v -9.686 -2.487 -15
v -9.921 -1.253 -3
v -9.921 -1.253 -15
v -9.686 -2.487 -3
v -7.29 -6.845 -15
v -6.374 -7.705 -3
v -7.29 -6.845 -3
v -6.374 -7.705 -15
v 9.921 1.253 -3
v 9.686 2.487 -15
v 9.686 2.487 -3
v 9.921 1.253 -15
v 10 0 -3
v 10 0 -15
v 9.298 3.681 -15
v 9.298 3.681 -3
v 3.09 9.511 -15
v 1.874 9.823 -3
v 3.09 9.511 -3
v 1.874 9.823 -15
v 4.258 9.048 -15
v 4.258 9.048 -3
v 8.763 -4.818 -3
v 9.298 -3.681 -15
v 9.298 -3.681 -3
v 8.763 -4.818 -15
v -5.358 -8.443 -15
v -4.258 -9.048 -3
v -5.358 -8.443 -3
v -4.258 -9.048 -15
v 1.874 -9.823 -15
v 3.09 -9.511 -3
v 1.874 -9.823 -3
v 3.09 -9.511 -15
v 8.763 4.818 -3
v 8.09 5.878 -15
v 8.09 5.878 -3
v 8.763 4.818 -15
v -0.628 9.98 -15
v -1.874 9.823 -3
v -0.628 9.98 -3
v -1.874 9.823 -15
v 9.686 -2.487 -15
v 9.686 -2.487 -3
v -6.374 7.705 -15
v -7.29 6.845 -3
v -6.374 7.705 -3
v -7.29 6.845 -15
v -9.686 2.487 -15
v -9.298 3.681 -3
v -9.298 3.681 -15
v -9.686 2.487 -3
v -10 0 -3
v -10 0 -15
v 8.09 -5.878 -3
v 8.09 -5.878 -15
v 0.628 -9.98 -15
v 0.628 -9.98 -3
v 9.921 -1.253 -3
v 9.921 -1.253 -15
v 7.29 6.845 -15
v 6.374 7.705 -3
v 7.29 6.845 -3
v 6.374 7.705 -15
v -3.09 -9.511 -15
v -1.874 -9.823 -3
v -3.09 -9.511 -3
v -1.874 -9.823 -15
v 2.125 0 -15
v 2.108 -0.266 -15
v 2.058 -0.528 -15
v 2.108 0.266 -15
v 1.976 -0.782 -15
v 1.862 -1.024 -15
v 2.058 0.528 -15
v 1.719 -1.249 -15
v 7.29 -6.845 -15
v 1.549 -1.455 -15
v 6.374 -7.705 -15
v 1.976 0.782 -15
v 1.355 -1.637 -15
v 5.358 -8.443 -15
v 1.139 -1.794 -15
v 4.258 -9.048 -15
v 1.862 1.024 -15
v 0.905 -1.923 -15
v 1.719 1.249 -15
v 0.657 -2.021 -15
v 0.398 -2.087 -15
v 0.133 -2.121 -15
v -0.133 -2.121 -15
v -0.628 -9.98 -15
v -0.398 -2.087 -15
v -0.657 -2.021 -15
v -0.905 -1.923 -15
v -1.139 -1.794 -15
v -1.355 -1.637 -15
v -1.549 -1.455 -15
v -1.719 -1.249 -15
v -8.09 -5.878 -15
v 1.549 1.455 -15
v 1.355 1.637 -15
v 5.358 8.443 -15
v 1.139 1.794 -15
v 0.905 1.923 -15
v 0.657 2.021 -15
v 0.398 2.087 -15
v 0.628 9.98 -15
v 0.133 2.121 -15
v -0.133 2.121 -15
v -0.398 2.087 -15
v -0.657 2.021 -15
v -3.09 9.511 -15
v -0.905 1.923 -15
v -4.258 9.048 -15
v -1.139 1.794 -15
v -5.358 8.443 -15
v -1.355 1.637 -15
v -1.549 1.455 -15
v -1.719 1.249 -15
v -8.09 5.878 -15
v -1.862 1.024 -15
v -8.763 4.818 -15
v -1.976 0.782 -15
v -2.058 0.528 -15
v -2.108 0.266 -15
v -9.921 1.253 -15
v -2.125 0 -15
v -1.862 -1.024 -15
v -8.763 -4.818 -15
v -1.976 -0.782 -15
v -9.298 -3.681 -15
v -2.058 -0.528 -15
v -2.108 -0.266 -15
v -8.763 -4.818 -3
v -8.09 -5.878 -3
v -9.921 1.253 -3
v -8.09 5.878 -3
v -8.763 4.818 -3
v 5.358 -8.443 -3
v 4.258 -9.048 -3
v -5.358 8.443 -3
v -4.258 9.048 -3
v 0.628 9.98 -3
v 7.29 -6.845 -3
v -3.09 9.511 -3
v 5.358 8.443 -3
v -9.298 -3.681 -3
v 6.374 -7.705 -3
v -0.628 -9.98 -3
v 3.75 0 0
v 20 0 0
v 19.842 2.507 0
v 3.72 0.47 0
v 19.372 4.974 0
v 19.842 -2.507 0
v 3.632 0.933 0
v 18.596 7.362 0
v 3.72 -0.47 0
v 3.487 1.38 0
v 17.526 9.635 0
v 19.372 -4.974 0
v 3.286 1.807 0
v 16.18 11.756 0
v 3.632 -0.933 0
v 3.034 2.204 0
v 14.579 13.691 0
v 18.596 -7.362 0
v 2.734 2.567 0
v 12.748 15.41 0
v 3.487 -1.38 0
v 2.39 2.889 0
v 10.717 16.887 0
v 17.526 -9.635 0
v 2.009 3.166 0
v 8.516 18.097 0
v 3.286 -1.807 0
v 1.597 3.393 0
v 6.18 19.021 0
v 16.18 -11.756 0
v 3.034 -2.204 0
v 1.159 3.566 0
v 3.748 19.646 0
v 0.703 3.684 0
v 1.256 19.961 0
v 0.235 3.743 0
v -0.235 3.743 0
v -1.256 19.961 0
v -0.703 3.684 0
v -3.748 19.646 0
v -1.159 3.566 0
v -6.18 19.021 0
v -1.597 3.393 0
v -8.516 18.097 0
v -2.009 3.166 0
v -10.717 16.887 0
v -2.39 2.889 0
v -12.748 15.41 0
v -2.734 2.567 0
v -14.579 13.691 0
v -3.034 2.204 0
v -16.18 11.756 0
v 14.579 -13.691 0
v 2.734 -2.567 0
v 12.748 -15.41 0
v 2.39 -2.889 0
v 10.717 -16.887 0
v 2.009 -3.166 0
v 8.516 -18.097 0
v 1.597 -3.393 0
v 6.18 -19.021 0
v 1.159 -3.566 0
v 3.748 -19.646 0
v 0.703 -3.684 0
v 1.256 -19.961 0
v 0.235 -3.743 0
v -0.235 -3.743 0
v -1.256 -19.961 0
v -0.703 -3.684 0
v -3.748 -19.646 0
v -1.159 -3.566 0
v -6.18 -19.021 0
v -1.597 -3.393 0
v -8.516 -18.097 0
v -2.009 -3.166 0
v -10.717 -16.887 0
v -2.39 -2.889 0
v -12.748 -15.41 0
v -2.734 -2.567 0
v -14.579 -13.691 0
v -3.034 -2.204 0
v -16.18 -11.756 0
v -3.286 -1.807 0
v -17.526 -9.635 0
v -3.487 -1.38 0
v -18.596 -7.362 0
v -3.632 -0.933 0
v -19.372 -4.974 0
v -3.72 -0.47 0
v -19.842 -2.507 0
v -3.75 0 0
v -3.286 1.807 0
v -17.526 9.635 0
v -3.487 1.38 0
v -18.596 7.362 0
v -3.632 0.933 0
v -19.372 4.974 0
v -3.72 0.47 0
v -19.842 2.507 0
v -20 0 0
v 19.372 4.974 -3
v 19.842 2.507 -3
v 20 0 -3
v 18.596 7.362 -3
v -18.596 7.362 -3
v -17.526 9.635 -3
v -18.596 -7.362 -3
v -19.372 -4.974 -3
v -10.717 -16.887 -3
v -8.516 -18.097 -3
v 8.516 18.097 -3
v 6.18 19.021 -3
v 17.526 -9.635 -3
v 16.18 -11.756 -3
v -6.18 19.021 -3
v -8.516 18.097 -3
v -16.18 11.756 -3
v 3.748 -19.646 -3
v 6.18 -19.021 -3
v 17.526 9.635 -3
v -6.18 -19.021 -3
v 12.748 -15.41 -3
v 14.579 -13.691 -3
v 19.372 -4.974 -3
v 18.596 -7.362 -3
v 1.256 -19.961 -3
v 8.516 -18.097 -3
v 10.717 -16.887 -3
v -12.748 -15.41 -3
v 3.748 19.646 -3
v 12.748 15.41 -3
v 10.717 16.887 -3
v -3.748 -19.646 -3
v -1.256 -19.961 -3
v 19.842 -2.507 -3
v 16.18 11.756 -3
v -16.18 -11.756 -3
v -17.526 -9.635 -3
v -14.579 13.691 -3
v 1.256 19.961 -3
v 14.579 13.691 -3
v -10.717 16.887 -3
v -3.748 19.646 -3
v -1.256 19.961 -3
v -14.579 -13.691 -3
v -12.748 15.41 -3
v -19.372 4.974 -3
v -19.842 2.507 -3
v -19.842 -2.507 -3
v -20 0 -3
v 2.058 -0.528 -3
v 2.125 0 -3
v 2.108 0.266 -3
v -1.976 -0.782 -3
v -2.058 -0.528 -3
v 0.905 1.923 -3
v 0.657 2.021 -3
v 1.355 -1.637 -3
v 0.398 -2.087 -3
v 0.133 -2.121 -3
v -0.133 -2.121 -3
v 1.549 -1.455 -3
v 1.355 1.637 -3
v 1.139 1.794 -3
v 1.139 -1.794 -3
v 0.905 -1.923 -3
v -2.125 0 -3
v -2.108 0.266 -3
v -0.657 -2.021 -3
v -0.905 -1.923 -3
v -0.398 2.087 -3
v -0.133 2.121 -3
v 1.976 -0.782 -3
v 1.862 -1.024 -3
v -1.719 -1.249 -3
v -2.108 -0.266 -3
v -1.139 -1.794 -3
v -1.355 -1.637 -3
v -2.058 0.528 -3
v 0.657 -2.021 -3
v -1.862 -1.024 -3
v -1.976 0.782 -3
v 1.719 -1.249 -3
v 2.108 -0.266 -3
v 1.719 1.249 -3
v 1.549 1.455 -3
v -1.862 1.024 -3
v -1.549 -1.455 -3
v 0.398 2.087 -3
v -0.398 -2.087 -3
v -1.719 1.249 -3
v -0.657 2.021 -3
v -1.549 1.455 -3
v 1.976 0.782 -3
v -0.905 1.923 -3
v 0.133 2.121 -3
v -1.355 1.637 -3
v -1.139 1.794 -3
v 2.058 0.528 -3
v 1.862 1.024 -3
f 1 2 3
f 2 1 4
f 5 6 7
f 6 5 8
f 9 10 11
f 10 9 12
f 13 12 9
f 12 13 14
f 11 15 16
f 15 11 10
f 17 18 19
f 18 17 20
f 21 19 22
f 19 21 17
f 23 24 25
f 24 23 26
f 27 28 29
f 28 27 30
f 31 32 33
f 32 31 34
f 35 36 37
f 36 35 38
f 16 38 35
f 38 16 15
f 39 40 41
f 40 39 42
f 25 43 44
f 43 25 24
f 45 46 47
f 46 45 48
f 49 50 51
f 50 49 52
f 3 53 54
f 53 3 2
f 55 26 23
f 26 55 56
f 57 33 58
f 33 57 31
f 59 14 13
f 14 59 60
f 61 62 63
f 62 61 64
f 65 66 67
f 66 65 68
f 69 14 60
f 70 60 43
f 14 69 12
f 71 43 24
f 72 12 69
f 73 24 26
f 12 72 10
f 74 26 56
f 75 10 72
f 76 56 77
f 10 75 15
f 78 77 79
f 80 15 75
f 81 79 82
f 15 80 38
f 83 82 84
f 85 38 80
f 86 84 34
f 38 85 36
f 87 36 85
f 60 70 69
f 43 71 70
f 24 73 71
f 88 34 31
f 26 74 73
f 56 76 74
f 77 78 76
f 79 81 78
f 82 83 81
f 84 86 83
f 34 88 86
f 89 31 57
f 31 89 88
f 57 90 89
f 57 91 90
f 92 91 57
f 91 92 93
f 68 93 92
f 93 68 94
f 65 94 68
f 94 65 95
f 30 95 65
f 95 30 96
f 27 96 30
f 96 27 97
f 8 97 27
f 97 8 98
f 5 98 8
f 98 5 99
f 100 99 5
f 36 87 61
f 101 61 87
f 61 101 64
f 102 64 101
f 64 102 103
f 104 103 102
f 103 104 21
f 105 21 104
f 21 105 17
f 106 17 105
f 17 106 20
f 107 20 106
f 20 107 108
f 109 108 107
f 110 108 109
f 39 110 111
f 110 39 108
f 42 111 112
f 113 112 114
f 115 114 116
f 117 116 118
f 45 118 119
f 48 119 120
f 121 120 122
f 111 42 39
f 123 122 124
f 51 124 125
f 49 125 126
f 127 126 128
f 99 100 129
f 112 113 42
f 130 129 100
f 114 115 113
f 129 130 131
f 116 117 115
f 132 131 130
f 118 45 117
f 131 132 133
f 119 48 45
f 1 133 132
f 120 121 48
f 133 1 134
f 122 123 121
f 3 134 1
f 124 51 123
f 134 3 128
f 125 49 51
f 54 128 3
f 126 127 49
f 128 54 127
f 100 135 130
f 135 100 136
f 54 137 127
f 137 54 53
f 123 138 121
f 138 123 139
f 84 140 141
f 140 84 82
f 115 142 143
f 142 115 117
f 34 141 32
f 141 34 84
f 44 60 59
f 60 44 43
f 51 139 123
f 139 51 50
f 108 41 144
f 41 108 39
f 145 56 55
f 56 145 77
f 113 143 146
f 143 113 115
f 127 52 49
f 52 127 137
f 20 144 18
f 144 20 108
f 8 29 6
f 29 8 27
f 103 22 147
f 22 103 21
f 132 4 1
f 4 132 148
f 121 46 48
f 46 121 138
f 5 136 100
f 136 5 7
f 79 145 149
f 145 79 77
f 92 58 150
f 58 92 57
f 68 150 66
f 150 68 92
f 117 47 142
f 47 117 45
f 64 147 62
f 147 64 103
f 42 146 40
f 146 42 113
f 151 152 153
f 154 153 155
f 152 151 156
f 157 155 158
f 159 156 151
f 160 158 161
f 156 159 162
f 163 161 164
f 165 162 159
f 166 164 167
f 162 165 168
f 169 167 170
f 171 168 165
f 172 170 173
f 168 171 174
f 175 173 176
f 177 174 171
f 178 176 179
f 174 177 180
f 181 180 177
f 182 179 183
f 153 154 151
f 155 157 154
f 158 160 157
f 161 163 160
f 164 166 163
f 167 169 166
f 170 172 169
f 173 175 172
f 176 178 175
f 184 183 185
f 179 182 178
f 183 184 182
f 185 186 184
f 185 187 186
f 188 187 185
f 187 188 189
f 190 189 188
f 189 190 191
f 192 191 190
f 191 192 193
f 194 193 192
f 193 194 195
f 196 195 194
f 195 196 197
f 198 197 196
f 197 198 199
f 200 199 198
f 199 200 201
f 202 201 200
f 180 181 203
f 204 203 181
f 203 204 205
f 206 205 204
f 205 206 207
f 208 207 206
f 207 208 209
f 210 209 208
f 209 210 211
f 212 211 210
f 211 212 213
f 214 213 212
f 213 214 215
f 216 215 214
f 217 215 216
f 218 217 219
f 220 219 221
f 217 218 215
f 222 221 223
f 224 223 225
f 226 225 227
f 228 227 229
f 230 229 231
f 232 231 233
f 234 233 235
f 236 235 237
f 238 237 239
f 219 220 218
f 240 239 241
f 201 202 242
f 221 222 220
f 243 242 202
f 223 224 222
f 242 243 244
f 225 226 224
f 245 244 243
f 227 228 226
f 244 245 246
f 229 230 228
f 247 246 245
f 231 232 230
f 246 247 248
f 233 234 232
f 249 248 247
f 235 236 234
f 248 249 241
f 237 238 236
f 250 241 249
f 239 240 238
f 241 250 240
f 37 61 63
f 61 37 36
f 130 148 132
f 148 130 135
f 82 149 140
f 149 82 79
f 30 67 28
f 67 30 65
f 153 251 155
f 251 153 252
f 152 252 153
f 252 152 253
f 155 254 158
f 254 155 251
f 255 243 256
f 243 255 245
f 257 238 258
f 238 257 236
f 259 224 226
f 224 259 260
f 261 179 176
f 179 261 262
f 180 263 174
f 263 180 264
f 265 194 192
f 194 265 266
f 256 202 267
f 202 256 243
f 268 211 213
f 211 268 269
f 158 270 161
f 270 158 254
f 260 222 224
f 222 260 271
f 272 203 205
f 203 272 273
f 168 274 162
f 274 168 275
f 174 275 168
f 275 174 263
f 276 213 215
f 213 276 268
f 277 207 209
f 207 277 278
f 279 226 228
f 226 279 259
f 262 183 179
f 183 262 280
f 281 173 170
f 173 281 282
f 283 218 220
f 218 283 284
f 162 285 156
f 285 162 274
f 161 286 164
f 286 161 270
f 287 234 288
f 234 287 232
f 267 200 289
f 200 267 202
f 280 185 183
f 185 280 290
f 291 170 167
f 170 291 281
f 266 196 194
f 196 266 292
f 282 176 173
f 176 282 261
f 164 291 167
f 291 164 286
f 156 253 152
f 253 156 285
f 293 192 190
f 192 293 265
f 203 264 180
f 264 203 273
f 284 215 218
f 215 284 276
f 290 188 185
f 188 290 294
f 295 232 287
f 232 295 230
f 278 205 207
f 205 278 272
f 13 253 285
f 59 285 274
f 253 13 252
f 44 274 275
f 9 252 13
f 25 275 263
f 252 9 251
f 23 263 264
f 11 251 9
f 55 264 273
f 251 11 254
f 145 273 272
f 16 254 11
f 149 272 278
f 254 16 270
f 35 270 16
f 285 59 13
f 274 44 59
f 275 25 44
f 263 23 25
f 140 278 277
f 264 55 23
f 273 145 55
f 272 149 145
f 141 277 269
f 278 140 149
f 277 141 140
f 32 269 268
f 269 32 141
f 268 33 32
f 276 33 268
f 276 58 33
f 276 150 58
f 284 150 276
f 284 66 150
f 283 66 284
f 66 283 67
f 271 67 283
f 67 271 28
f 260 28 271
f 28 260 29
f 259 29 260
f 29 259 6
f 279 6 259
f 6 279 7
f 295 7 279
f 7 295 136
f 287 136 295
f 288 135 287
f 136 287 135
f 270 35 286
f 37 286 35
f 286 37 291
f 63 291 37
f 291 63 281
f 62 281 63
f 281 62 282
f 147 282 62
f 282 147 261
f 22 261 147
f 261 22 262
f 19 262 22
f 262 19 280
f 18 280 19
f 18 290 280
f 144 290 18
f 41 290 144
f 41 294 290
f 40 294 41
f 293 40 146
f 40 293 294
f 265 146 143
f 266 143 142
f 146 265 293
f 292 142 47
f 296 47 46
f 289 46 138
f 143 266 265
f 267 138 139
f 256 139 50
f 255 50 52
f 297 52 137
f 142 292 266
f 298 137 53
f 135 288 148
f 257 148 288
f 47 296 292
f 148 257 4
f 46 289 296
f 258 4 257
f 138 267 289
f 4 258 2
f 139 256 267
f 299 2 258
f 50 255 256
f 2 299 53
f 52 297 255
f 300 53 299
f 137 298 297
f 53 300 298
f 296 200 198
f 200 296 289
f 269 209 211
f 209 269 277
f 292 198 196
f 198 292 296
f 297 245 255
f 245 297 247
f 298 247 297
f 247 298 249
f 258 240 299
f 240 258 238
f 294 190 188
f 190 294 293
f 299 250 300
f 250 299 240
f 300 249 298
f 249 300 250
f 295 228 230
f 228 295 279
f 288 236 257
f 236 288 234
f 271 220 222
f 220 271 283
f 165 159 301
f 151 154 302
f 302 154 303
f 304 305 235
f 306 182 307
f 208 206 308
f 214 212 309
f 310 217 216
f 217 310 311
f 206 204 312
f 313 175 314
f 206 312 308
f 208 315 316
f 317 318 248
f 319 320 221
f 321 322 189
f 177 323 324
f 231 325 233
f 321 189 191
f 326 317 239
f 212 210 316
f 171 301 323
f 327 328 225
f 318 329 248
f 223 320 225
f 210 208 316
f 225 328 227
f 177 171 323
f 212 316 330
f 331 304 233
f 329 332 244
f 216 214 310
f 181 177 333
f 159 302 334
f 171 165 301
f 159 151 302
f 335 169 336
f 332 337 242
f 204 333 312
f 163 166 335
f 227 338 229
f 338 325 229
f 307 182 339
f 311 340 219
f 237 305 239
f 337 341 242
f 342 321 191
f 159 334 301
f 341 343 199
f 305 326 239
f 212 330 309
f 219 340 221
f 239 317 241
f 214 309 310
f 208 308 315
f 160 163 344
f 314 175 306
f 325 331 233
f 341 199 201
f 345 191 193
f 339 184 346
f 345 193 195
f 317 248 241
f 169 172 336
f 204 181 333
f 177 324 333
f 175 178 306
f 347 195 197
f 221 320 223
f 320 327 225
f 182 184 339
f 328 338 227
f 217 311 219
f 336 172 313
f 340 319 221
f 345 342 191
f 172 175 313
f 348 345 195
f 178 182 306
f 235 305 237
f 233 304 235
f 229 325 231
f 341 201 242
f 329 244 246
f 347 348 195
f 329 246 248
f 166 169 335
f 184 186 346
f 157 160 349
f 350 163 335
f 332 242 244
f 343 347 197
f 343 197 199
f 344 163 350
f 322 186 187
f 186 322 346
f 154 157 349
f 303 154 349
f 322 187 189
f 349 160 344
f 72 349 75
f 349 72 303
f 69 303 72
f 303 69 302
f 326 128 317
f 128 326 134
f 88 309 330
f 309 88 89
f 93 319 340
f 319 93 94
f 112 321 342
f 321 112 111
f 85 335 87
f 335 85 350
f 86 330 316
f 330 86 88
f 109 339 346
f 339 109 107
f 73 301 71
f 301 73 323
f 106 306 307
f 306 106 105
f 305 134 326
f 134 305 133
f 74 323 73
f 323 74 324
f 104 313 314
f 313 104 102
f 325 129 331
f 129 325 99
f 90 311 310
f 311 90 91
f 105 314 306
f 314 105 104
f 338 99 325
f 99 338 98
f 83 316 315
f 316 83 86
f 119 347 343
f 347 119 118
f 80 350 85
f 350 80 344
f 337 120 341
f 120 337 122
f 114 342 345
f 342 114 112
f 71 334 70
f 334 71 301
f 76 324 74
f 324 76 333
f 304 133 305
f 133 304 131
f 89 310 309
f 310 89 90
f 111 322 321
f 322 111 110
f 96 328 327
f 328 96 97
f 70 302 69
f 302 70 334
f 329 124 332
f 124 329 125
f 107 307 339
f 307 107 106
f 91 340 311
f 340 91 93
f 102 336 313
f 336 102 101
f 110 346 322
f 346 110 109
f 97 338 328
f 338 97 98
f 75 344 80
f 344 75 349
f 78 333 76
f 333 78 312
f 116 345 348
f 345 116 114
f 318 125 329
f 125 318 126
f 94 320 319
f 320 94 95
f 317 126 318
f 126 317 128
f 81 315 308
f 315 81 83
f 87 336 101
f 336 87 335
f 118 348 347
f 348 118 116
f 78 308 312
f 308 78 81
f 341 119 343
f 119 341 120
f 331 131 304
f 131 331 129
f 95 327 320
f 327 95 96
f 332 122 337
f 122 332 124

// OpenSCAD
$fn = 50;


difference() {
	union() {
		translate(v = [0, 0, -15.0000000000]) {
			cylinder(h = 15, r = 10.0000000000);
		}
		translate(v = [0, 0, -3.0000000000]) {
			cylinder(h = 3, r = 20.0000000000);
		}
	}
	union() {
		translate(v = [0, 0, 0]) {
			rotate(a = [0, 0, 0]) {
				difference() {
					union() {
						#translate(v = [0, 0, -15.0000000000]) {
							cylinder(h = 15, r = 2.0000000000);
						}
						#translate(v = [0, 0, -3]) {
							cylinder(h = 3, r = 10.0000000000, r1 = 2.1250000000, r2 = 3.7500000000);
						}
						#translate(v = [0, 0, -15.0000000000]) {
							cylinder(h = 15, r = 2.1250000000);
						}
						#translate(v = [0, 0, -15.0000000000]) {
							cylinder(h = 15, r = 2.0000000000);
						}
					}
					union();
				}
			}
		}
	}
}
